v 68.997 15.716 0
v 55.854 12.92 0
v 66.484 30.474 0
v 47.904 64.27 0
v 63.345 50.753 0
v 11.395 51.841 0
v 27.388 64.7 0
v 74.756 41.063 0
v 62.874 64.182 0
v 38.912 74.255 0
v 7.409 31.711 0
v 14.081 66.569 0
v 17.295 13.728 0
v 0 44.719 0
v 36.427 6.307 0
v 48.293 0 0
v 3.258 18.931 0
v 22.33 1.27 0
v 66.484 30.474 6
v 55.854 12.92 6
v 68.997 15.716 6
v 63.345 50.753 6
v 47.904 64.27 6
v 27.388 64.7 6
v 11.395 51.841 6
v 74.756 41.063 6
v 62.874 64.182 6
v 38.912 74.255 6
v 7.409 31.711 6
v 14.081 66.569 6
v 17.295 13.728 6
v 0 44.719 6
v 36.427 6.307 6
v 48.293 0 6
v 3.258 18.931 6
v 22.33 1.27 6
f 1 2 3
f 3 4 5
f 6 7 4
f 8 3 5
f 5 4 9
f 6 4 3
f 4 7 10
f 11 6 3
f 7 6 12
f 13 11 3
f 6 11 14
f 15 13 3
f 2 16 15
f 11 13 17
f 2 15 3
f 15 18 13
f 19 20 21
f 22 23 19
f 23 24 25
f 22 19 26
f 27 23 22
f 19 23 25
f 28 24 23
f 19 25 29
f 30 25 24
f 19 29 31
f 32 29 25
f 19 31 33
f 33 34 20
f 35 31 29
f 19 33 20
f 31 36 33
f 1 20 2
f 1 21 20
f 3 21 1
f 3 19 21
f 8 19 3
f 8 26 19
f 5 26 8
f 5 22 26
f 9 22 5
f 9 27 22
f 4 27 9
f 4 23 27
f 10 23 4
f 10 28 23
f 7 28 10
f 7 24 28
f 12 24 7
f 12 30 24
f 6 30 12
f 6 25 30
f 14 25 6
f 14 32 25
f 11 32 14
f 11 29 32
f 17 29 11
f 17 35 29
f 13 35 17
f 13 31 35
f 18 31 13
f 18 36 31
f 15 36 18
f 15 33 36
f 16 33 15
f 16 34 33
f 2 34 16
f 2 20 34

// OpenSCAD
$fn = 32;

// ----------------------------------------------------------------------
// Chain sprocket: 9 teeth, 30 mm root radius
// ----------------------------------------------------------------------

// --- parameters (mm) ---
profile_height = 6;       // extrusion height
profile_points = 18;      // points of the closed outline

profile = [[66.484, 30.474], [74.756, 41.063], [63.345, 50.753], [62.874, 64.182], [47.904, 64.27], [38.912, 74.255], [27.388, 64.7], [14.081, 66.569], [11.395, 51.841], [0, 44.719], [7.409, 31.711], [3.258, 18.931], [17.295, 13.728], [22.33, 1.27], [36.427, 6.307], [48.293, 0], [55.854, 12.92], [68.997, 15.716]];  // single closed polygon, 18 points, counter clockwise

// --- the one profile operation ---
linear_extrude(height = profile_height) polygon(points = profile);
